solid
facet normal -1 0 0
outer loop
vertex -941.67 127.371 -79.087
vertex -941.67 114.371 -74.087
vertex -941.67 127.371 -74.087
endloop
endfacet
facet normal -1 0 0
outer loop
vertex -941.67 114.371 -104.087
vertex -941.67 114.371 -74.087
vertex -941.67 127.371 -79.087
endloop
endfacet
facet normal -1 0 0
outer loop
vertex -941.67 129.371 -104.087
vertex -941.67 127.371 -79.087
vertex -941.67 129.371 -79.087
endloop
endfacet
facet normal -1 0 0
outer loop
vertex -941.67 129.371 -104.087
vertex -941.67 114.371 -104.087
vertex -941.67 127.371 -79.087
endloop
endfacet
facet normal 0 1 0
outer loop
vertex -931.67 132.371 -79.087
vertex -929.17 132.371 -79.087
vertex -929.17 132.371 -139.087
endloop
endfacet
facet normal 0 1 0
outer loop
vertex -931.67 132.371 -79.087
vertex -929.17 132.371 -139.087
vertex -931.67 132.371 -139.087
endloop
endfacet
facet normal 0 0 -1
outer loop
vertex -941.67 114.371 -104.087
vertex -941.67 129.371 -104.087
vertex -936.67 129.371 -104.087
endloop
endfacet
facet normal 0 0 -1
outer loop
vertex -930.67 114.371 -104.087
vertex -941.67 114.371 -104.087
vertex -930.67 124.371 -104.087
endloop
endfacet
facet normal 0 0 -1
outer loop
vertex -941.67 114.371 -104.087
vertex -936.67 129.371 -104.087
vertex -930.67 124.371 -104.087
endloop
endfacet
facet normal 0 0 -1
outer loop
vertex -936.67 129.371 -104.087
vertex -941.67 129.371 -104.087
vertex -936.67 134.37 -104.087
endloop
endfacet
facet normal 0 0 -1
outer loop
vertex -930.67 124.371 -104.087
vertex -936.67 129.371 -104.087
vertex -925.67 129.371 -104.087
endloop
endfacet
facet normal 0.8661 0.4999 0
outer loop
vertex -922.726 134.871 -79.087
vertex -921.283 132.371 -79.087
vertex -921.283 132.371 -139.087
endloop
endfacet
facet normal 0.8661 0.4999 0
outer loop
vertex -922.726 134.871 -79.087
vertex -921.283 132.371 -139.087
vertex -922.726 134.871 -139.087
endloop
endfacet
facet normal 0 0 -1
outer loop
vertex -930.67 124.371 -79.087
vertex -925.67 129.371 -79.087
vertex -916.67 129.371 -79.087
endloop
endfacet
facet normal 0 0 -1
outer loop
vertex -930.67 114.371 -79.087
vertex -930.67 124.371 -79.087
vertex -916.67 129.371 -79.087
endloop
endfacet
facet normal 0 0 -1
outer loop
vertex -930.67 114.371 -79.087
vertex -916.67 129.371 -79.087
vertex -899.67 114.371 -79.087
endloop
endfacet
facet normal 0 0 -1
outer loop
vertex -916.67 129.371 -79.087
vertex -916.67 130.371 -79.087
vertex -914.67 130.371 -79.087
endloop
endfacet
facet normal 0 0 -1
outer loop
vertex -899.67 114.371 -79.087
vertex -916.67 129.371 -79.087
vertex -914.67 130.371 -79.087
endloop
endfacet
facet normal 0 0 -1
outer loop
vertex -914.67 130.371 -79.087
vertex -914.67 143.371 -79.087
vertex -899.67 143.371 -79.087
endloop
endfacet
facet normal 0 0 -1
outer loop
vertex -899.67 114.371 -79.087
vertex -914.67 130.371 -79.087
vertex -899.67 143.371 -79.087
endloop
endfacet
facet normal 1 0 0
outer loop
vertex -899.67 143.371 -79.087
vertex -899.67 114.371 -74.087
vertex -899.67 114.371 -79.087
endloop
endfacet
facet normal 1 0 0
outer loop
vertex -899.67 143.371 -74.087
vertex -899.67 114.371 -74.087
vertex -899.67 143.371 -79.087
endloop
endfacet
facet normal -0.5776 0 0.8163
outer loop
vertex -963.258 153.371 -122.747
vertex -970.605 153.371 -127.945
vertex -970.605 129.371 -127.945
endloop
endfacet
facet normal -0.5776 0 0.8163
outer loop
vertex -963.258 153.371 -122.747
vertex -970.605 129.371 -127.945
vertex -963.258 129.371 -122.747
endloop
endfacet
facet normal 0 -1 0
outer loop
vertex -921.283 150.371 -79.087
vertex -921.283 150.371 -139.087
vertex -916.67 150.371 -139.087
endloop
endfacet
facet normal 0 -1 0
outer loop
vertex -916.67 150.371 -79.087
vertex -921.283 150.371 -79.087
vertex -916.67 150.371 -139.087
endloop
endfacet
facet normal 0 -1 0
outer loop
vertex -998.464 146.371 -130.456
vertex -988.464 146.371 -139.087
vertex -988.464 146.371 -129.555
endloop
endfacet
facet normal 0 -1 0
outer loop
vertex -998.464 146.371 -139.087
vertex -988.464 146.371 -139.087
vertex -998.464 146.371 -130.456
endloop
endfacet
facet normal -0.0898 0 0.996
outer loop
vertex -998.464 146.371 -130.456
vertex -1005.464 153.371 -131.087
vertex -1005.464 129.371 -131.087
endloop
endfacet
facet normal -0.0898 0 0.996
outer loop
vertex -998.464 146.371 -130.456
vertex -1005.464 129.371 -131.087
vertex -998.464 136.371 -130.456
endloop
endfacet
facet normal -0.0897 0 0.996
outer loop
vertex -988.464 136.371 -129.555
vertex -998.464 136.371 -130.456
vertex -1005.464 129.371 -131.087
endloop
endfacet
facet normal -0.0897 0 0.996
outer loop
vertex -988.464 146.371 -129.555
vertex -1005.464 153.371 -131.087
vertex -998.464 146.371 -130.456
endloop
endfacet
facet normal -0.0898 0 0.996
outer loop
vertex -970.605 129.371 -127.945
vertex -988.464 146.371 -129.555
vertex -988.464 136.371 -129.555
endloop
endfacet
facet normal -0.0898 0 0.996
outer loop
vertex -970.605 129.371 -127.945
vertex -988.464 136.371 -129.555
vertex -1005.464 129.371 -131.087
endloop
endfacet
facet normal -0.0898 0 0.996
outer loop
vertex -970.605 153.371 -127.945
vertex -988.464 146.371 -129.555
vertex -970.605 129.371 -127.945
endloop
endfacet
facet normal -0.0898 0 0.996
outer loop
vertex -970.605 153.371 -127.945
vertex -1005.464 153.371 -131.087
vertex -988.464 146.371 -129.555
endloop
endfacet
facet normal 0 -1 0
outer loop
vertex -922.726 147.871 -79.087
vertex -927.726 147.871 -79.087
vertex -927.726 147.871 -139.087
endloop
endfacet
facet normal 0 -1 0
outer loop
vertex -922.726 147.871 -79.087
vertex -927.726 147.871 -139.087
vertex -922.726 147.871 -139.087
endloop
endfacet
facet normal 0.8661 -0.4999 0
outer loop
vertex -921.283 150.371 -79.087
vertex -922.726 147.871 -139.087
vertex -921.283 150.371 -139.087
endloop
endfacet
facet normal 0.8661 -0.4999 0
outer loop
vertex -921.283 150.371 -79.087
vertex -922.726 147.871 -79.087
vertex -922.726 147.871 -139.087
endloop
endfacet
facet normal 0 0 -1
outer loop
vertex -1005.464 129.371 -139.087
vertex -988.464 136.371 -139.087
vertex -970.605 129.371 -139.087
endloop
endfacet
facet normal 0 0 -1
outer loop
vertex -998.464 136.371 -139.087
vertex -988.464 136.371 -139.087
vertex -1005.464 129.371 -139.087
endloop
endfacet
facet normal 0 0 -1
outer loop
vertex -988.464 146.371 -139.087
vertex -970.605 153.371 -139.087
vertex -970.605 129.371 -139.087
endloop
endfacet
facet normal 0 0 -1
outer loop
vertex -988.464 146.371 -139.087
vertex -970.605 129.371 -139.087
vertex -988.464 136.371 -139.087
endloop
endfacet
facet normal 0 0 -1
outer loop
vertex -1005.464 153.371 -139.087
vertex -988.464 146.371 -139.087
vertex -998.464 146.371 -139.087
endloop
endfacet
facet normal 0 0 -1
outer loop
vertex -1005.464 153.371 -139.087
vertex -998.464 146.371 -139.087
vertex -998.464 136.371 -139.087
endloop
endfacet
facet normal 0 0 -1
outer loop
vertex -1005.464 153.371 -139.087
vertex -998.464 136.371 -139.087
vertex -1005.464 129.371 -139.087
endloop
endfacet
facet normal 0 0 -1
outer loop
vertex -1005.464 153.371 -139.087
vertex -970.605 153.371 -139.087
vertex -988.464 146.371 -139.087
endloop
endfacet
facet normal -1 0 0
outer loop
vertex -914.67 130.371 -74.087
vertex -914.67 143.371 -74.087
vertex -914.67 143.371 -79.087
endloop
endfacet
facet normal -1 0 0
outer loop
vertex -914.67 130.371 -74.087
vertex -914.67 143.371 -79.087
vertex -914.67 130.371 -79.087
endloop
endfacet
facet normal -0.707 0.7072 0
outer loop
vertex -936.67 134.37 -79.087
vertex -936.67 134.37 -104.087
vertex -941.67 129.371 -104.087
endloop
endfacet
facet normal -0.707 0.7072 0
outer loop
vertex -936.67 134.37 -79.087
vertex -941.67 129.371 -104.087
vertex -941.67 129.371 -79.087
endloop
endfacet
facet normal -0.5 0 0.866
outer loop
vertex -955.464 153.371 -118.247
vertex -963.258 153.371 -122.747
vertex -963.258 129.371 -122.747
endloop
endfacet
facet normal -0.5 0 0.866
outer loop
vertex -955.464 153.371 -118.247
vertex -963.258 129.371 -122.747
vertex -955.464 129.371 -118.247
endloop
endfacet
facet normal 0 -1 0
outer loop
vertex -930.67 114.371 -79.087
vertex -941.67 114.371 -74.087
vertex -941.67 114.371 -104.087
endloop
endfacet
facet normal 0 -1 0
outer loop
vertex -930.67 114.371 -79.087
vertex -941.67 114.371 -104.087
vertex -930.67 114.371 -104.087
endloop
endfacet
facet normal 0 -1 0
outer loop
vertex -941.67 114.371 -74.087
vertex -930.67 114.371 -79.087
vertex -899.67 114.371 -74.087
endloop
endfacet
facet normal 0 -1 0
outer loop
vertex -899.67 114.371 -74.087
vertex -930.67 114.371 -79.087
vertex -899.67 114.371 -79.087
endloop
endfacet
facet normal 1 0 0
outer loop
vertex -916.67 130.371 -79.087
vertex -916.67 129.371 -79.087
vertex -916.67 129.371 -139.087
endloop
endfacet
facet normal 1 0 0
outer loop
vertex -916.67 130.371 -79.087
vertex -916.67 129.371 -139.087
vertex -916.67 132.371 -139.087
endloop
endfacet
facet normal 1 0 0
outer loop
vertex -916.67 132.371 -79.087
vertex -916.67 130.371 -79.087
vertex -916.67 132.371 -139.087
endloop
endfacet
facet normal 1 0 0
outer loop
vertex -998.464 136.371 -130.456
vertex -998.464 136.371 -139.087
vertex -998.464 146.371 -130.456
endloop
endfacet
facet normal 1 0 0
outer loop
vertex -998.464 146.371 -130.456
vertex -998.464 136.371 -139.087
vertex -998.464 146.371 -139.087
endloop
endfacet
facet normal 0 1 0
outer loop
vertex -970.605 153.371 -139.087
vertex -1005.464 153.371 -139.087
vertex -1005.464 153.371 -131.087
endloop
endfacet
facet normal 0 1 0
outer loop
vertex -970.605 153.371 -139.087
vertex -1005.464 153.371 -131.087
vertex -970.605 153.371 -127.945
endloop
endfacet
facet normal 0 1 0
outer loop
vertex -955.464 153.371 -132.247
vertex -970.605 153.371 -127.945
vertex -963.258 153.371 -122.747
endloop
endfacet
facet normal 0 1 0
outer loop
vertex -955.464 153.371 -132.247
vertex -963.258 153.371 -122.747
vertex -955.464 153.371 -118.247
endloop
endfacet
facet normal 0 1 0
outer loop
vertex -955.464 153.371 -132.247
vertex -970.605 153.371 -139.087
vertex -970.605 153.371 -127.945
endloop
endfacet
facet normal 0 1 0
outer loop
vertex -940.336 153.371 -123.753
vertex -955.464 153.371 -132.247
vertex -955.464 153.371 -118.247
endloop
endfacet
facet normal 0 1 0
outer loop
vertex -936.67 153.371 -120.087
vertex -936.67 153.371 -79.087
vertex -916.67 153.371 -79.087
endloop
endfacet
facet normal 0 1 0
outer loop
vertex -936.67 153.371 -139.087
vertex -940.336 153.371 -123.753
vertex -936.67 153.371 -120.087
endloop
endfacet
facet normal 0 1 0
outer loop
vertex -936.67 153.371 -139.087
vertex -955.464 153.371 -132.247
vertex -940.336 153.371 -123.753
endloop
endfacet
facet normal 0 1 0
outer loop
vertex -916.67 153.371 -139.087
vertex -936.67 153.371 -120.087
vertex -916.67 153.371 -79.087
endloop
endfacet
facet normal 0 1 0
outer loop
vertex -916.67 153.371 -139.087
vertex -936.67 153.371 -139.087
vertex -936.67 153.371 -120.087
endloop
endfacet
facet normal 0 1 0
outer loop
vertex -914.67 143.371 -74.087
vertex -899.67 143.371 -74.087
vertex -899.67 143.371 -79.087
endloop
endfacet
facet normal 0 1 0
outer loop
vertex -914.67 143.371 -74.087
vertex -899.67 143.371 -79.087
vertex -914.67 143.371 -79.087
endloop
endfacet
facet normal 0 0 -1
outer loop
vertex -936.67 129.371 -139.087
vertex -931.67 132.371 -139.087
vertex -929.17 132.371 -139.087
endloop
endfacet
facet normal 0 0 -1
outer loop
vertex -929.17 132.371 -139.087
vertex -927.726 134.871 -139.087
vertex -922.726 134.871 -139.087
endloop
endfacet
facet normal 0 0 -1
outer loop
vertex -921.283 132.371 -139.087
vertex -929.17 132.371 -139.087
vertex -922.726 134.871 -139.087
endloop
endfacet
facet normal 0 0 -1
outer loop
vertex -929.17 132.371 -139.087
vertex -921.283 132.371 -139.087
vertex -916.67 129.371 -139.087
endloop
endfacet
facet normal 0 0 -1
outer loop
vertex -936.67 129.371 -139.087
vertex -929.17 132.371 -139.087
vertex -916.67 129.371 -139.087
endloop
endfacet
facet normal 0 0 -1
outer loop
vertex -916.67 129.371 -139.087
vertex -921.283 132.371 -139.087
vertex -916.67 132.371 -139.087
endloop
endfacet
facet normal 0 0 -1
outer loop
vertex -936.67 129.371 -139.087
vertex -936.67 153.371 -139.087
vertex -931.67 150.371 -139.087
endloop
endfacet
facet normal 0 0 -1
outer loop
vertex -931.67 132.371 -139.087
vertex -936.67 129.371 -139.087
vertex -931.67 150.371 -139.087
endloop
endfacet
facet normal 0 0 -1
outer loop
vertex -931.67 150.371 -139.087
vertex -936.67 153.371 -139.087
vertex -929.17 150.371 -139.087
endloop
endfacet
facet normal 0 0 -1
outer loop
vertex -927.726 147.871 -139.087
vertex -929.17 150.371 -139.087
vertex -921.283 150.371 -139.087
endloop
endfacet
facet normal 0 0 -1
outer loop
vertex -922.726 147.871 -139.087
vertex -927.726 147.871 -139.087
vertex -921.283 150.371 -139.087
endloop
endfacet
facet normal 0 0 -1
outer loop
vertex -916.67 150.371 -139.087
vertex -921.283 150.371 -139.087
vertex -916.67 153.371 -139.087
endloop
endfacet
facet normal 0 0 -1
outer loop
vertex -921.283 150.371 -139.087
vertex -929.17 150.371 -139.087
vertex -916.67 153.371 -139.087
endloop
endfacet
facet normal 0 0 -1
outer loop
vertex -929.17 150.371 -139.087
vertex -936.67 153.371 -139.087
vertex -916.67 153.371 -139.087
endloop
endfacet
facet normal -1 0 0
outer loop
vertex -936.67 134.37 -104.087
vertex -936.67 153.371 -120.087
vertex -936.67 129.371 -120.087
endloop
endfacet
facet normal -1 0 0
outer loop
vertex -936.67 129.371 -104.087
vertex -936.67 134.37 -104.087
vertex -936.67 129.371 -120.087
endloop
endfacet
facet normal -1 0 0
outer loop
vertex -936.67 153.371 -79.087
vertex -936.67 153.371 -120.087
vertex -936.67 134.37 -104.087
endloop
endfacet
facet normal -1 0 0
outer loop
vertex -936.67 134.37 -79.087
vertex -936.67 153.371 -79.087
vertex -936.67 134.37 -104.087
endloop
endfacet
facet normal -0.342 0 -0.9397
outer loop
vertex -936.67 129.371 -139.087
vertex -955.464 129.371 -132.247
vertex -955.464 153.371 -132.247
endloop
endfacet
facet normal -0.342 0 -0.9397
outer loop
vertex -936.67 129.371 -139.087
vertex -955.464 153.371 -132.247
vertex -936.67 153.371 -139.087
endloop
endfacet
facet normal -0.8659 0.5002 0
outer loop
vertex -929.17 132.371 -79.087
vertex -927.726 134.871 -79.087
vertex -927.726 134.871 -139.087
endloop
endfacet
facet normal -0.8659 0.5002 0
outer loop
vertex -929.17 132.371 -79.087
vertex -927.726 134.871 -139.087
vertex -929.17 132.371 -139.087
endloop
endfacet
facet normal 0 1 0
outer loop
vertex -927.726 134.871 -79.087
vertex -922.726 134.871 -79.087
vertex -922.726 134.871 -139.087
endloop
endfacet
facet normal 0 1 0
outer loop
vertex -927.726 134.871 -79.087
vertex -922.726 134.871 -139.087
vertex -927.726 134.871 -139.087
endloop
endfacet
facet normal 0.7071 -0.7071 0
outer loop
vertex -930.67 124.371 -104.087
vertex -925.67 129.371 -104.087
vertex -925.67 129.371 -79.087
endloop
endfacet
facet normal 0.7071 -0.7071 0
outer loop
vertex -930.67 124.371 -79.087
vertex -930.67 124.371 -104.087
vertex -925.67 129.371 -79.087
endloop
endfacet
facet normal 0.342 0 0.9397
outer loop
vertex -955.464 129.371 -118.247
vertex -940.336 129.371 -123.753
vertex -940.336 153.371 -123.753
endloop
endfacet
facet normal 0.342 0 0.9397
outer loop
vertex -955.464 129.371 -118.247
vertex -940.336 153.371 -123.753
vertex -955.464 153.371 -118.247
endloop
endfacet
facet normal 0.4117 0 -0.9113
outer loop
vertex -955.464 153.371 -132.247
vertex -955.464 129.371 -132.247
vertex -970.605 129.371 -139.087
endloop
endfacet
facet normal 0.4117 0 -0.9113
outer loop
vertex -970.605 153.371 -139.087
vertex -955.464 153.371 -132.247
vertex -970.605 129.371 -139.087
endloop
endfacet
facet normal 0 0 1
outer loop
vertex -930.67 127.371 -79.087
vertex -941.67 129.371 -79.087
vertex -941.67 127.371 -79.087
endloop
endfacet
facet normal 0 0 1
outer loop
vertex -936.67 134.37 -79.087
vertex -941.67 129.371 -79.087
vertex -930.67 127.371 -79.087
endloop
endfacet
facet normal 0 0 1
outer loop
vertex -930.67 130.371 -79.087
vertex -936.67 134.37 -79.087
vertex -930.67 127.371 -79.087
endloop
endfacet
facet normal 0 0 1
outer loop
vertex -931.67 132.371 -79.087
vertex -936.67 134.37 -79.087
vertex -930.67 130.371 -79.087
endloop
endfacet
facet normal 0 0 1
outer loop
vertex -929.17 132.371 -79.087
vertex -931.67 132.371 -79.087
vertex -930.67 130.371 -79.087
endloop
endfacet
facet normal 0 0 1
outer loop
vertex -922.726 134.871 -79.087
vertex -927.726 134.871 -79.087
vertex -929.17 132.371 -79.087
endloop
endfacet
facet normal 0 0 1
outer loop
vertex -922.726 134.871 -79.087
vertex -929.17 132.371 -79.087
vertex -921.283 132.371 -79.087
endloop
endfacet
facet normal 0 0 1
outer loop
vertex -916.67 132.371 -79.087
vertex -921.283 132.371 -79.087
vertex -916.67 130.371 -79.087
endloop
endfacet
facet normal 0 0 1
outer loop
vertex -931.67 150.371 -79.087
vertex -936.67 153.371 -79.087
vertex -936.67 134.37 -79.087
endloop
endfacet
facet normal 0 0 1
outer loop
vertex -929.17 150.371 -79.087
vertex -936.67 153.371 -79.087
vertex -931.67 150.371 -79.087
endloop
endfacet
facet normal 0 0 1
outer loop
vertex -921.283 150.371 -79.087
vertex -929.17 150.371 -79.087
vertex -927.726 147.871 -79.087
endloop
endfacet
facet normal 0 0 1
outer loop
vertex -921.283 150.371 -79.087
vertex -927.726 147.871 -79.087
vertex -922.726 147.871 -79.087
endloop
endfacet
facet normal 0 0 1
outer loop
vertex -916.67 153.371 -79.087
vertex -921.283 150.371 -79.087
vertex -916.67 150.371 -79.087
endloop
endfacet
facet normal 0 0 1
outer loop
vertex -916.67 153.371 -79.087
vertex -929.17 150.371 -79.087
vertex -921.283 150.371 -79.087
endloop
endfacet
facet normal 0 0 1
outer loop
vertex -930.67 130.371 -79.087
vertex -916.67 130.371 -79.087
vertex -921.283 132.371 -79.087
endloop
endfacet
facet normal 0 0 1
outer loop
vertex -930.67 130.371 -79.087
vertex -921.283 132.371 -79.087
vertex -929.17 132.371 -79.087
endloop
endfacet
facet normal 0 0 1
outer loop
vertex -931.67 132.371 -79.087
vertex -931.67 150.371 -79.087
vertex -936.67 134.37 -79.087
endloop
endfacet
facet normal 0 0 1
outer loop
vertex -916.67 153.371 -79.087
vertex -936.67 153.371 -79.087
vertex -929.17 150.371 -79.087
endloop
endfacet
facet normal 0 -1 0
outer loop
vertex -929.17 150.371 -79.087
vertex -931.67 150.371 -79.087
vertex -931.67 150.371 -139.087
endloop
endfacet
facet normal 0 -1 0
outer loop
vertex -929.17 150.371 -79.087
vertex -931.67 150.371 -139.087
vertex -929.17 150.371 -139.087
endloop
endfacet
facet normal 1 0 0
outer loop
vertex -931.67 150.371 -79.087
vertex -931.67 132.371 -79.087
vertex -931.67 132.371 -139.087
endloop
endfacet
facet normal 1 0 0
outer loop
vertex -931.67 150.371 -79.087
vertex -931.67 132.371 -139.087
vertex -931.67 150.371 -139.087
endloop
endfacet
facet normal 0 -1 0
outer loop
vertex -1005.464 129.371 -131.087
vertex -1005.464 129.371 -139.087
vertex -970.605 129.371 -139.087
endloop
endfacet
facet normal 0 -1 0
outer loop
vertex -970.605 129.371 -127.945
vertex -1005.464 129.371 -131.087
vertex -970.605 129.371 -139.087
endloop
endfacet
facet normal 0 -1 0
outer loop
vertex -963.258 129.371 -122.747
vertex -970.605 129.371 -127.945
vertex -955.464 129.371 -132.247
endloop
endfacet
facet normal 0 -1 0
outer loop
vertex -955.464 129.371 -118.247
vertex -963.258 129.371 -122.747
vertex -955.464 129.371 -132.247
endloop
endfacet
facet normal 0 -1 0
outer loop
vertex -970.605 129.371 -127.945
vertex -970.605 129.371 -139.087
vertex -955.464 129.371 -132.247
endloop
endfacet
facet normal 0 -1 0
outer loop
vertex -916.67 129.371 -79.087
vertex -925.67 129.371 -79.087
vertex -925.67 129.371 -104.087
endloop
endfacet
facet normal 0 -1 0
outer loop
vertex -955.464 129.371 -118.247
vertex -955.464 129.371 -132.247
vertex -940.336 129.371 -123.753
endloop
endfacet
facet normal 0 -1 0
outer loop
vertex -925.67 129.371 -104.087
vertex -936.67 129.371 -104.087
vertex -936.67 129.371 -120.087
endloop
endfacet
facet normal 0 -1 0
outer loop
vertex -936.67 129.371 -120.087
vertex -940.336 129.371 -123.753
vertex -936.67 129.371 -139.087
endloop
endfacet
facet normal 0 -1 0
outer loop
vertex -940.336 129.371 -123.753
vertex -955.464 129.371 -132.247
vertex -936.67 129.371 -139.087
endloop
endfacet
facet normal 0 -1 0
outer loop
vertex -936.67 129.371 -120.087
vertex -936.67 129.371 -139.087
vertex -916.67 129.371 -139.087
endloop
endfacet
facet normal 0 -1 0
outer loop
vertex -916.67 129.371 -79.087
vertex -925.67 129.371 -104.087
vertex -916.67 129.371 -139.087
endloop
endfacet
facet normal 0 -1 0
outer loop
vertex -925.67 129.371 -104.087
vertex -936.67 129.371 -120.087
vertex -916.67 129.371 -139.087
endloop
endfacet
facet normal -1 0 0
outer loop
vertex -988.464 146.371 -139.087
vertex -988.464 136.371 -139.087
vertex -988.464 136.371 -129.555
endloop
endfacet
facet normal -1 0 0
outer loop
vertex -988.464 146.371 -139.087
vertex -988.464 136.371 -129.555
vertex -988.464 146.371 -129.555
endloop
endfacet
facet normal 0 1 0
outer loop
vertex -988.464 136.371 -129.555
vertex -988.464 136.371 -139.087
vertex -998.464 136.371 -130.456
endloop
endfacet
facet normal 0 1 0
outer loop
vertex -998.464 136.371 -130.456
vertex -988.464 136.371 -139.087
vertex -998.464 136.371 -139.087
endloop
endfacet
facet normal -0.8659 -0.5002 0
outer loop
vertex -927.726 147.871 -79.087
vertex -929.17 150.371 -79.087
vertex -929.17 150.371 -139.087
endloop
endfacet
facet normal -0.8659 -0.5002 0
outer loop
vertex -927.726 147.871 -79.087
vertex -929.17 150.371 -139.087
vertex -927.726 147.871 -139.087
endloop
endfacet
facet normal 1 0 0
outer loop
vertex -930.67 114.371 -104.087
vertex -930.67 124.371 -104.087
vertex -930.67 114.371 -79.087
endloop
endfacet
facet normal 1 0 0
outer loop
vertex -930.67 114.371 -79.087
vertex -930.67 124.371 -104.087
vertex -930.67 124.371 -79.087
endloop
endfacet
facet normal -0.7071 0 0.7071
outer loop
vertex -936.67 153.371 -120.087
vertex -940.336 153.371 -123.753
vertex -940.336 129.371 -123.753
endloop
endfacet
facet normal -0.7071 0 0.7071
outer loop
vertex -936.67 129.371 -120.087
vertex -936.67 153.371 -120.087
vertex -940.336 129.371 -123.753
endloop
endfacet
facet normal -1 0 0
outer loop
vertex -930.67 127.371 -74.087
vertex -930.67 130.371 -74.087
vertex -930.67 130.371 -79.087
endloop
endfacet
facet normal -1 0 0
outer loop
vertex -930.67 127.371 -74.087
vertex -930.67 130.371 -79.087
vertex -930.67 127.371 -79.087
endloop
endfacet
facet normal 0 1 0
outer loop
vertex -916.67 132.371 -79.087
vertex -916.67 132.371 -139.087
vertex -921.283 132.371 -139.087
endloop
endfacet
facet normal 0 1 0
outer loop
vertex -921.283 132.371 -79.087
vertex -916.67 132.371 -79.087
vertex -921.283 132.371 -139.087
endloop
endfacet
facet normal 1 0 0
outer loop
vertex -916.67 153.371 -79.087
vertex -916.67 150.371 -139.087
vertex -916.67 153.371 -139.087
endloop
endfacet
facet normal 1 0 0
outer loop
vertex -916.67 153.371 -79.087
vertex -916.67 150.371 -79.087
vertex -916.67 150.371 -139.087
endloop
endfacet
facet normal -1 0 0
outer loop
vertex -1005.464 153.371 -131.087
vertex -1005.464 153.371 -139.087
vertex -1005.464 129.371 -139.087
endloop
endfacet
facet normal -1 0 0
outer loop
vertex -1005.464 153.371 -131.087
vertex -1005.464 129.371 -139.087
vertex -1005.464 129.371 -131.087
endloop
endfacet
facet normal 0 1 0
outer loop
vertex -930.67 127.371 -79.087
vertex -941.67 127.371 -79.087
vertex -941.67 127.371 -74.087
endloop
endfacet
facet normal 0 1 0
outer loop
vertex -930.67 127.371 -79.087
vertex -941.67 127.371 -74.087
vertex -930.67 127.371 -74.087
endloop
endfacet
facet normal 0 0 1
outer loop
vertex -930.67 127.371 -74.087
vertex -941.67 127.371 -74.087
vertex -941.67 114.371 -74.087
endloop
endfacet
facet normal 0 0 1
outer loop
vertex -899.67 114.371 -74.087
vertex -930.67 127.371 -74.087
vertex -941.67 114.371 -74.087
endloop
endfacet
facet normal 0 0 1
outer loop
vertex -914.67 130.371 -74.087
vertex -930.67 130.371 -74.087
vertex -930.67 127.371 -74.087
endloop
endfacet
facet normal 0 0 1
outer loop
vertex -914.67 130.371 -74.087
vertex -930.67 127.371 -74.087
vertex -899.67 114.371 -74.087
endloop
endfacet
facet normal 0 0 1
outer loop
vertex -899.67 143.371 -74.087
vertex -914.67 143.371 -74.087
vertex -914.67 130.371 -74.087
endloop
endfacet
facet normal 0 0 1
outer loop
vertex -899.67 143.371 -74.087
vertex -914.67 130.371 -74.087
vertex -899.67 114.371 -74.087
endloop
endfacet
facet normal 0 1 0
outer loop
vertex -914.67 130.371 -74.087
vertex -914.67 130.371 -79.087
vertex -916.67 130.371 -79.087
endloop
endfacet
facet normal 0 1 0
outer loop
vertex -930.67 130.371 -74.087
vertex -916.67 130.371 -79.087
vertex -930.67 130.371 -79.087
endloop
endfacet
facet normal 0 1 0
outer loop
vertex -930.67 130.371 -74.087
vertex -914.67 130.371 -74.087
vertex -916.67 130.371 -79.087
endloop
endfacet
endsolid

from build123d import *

# Parameters (mm, degrees)
BOSS_EXTRUDE1_DEPTH = 30
SKETCH2_W           = 11
SKETCH2_H           = 25
BOSS_EXTRUDE2_DEPTH = 15
CHAMFER1_SIZE       = 5
SKETCH3_W           = 42
SKETCH3_H           = 13
BOSS_EXTRUDE3_DEPTH = 5
BOSS_EXTRUDE4_DEPTH = 5
BOSS_EXTRUDE5_DEPTH = 24
CHAMFER2_SIZE       = 5
CHAMFER2_SIZE2      = 3.901030044
BOSS_EXTRUDE6_DEPTH = 24
SKETCH7_W           = 10
SKETCH7_H           = 10
CUT_EXTRUDE1_DEPTH  = 10


with BuildPart() as part:
    # Sketch1 → Boss-Extrude1 (new, symmetric)
    with BuildSketch(Plane.XY.offset(-109.087000354)):
        Polygon((-916.669839571, 150.370500968), (-916.669839571, 153.370500968), (-936.669839571, 153.370500968), (-936.669839571, 129.370500968), (-916.669839571, 129.370500968), (-916.669839571, 132.370500968), (-921.283088225, 132.370500968), (-922.726463898, 134.870500968), (-927.726463898, 134.870500968), (-929.169839571, 132.370500968), (-931.669839571, 132.370500968), (-931.669839571, 150.370500968), (-929.169839571, 150.370500968), (-927.726463898, 147.870500968), (-922.726463898, 147.870500968), (-921.283088225, 150.370500968), align=None)
    extrude(amount=BOSS_EXTRUDE1_DEPTH, both=True)

    # Sketch2 → Boss-Extrude2 (add)
    with BuildSketch(Plane.XZ.offset(-129.370500968)):
        with Locations((-936.169839571, -91.587000354)):
            Rectangle(SKETCH2_W, SKETCH2_H)
    extrude(amount=BOSS_EXTRUDE2_DEPTH)

    # Chamfer1
    chamfer1_edges = [part.edges().sort_by_distance(p)[0] for p in [
        (-936.669839571, 129.370500968, -91.587000354),
        (-930.669839571, 129.370500968, -91.587000354),
    ]]
    chamfer(chamfer1_edges, length=CHAMFER1_SIZE - 0.0001)  # a hair under: the kernel refuses the full size

    # Sketch3 → Boss-Extrude3 (add)
    with BuildSketch(Plane.XY.offset(-79.087000354)):
        with Locations((-920.669839571, 120.870500968)):
            Rectangle(SKETCH3_W, SKETCH3_H)
    extrude(amount=BOSS_EXTRUDE3_DEPTH)

    # Sketch4 → Boss-Extrude4 (add)
    with BuildSketch(Plane.XY.offset(-74.087000354)):
        Polygon((-899.669839571, 127.370500968), (-899.669839571, 143.370500968), (-914.669839571, 143.370500968), (-914.669839571, 130.370500968), (-930.669839571, 130.370500968), (-930.669839571, 127.370500968), align=None)
    extrude(amount=-BOSS_EXTRUDE4_DEPTH)

    # Sketch5 → Boss-Extrude5 (add)
    with BuildSketch(Plane(origin=(0, 153.370500968, 0), x_dir=(1, 0, 0), z_dir=(0, 1, 0))):
        Polygon((-936.669839571, 139.087000354), (-936.669839571, 125.087000354), (-955.463691986, 118.246597487), (-955.463691986, 132.246597487), align=None)
    extrude(amount=-BOSS_EXTRUDE5_DEPTH)

    # Chamfer2
    chamfer2_edges = [part.edges().sort_by_distance(p)[0] for p in [
        (-936.669839571, 141.370500968, -125.087000354),
    ]]
    chamfer2_side = [part.faces().sort_by_distance(p)[0] for p in [
        (-936.669839571, 142.583452416, -103.427623846),
    ]]
    chamfer(chamfer2_edges, length=CHAMFER2_SIZE, length2=CHAMFER2_SIZE2, reference=chamfer2_side[0])

    # Sketch6 → Boss-Extrude6 (add)
    with BuildSketch(Plane(origin=(0, 153.370500968, 0), x_dir=(1, 0, 0), z_dir=(0, 1, 0))):
        Polygon((-955.463691986, 132.246597487), (-970.605038874, 139.087000354), (-1005.463691986, 139.087000354), (-1005.463691986, 131.087000354), (-970.605038874, 127.94465995), (-963.25792062, 122.746597487), (-955.463691986, 118.246597487), align=None)
    extrude(amount=-BOSS_EXTRUDE6_DEPTH)

    # Sketch7 → Cut-Extrude1 (cut)
    with BuildSketch(Plane(origin=(0, 0, -139.087000354), x_dir=(-1, 0, 0), z_dir=(0, 0, -1))):
        with Locations((993.463691986, 141.370500968)):
            Rectangle(SKETCH7_W, SKETCH7_H)
    extrude(amount=-CUT_EXTRUDE1_DEPTH, mode=Mode.SUBTRACT)


solid = part.part
